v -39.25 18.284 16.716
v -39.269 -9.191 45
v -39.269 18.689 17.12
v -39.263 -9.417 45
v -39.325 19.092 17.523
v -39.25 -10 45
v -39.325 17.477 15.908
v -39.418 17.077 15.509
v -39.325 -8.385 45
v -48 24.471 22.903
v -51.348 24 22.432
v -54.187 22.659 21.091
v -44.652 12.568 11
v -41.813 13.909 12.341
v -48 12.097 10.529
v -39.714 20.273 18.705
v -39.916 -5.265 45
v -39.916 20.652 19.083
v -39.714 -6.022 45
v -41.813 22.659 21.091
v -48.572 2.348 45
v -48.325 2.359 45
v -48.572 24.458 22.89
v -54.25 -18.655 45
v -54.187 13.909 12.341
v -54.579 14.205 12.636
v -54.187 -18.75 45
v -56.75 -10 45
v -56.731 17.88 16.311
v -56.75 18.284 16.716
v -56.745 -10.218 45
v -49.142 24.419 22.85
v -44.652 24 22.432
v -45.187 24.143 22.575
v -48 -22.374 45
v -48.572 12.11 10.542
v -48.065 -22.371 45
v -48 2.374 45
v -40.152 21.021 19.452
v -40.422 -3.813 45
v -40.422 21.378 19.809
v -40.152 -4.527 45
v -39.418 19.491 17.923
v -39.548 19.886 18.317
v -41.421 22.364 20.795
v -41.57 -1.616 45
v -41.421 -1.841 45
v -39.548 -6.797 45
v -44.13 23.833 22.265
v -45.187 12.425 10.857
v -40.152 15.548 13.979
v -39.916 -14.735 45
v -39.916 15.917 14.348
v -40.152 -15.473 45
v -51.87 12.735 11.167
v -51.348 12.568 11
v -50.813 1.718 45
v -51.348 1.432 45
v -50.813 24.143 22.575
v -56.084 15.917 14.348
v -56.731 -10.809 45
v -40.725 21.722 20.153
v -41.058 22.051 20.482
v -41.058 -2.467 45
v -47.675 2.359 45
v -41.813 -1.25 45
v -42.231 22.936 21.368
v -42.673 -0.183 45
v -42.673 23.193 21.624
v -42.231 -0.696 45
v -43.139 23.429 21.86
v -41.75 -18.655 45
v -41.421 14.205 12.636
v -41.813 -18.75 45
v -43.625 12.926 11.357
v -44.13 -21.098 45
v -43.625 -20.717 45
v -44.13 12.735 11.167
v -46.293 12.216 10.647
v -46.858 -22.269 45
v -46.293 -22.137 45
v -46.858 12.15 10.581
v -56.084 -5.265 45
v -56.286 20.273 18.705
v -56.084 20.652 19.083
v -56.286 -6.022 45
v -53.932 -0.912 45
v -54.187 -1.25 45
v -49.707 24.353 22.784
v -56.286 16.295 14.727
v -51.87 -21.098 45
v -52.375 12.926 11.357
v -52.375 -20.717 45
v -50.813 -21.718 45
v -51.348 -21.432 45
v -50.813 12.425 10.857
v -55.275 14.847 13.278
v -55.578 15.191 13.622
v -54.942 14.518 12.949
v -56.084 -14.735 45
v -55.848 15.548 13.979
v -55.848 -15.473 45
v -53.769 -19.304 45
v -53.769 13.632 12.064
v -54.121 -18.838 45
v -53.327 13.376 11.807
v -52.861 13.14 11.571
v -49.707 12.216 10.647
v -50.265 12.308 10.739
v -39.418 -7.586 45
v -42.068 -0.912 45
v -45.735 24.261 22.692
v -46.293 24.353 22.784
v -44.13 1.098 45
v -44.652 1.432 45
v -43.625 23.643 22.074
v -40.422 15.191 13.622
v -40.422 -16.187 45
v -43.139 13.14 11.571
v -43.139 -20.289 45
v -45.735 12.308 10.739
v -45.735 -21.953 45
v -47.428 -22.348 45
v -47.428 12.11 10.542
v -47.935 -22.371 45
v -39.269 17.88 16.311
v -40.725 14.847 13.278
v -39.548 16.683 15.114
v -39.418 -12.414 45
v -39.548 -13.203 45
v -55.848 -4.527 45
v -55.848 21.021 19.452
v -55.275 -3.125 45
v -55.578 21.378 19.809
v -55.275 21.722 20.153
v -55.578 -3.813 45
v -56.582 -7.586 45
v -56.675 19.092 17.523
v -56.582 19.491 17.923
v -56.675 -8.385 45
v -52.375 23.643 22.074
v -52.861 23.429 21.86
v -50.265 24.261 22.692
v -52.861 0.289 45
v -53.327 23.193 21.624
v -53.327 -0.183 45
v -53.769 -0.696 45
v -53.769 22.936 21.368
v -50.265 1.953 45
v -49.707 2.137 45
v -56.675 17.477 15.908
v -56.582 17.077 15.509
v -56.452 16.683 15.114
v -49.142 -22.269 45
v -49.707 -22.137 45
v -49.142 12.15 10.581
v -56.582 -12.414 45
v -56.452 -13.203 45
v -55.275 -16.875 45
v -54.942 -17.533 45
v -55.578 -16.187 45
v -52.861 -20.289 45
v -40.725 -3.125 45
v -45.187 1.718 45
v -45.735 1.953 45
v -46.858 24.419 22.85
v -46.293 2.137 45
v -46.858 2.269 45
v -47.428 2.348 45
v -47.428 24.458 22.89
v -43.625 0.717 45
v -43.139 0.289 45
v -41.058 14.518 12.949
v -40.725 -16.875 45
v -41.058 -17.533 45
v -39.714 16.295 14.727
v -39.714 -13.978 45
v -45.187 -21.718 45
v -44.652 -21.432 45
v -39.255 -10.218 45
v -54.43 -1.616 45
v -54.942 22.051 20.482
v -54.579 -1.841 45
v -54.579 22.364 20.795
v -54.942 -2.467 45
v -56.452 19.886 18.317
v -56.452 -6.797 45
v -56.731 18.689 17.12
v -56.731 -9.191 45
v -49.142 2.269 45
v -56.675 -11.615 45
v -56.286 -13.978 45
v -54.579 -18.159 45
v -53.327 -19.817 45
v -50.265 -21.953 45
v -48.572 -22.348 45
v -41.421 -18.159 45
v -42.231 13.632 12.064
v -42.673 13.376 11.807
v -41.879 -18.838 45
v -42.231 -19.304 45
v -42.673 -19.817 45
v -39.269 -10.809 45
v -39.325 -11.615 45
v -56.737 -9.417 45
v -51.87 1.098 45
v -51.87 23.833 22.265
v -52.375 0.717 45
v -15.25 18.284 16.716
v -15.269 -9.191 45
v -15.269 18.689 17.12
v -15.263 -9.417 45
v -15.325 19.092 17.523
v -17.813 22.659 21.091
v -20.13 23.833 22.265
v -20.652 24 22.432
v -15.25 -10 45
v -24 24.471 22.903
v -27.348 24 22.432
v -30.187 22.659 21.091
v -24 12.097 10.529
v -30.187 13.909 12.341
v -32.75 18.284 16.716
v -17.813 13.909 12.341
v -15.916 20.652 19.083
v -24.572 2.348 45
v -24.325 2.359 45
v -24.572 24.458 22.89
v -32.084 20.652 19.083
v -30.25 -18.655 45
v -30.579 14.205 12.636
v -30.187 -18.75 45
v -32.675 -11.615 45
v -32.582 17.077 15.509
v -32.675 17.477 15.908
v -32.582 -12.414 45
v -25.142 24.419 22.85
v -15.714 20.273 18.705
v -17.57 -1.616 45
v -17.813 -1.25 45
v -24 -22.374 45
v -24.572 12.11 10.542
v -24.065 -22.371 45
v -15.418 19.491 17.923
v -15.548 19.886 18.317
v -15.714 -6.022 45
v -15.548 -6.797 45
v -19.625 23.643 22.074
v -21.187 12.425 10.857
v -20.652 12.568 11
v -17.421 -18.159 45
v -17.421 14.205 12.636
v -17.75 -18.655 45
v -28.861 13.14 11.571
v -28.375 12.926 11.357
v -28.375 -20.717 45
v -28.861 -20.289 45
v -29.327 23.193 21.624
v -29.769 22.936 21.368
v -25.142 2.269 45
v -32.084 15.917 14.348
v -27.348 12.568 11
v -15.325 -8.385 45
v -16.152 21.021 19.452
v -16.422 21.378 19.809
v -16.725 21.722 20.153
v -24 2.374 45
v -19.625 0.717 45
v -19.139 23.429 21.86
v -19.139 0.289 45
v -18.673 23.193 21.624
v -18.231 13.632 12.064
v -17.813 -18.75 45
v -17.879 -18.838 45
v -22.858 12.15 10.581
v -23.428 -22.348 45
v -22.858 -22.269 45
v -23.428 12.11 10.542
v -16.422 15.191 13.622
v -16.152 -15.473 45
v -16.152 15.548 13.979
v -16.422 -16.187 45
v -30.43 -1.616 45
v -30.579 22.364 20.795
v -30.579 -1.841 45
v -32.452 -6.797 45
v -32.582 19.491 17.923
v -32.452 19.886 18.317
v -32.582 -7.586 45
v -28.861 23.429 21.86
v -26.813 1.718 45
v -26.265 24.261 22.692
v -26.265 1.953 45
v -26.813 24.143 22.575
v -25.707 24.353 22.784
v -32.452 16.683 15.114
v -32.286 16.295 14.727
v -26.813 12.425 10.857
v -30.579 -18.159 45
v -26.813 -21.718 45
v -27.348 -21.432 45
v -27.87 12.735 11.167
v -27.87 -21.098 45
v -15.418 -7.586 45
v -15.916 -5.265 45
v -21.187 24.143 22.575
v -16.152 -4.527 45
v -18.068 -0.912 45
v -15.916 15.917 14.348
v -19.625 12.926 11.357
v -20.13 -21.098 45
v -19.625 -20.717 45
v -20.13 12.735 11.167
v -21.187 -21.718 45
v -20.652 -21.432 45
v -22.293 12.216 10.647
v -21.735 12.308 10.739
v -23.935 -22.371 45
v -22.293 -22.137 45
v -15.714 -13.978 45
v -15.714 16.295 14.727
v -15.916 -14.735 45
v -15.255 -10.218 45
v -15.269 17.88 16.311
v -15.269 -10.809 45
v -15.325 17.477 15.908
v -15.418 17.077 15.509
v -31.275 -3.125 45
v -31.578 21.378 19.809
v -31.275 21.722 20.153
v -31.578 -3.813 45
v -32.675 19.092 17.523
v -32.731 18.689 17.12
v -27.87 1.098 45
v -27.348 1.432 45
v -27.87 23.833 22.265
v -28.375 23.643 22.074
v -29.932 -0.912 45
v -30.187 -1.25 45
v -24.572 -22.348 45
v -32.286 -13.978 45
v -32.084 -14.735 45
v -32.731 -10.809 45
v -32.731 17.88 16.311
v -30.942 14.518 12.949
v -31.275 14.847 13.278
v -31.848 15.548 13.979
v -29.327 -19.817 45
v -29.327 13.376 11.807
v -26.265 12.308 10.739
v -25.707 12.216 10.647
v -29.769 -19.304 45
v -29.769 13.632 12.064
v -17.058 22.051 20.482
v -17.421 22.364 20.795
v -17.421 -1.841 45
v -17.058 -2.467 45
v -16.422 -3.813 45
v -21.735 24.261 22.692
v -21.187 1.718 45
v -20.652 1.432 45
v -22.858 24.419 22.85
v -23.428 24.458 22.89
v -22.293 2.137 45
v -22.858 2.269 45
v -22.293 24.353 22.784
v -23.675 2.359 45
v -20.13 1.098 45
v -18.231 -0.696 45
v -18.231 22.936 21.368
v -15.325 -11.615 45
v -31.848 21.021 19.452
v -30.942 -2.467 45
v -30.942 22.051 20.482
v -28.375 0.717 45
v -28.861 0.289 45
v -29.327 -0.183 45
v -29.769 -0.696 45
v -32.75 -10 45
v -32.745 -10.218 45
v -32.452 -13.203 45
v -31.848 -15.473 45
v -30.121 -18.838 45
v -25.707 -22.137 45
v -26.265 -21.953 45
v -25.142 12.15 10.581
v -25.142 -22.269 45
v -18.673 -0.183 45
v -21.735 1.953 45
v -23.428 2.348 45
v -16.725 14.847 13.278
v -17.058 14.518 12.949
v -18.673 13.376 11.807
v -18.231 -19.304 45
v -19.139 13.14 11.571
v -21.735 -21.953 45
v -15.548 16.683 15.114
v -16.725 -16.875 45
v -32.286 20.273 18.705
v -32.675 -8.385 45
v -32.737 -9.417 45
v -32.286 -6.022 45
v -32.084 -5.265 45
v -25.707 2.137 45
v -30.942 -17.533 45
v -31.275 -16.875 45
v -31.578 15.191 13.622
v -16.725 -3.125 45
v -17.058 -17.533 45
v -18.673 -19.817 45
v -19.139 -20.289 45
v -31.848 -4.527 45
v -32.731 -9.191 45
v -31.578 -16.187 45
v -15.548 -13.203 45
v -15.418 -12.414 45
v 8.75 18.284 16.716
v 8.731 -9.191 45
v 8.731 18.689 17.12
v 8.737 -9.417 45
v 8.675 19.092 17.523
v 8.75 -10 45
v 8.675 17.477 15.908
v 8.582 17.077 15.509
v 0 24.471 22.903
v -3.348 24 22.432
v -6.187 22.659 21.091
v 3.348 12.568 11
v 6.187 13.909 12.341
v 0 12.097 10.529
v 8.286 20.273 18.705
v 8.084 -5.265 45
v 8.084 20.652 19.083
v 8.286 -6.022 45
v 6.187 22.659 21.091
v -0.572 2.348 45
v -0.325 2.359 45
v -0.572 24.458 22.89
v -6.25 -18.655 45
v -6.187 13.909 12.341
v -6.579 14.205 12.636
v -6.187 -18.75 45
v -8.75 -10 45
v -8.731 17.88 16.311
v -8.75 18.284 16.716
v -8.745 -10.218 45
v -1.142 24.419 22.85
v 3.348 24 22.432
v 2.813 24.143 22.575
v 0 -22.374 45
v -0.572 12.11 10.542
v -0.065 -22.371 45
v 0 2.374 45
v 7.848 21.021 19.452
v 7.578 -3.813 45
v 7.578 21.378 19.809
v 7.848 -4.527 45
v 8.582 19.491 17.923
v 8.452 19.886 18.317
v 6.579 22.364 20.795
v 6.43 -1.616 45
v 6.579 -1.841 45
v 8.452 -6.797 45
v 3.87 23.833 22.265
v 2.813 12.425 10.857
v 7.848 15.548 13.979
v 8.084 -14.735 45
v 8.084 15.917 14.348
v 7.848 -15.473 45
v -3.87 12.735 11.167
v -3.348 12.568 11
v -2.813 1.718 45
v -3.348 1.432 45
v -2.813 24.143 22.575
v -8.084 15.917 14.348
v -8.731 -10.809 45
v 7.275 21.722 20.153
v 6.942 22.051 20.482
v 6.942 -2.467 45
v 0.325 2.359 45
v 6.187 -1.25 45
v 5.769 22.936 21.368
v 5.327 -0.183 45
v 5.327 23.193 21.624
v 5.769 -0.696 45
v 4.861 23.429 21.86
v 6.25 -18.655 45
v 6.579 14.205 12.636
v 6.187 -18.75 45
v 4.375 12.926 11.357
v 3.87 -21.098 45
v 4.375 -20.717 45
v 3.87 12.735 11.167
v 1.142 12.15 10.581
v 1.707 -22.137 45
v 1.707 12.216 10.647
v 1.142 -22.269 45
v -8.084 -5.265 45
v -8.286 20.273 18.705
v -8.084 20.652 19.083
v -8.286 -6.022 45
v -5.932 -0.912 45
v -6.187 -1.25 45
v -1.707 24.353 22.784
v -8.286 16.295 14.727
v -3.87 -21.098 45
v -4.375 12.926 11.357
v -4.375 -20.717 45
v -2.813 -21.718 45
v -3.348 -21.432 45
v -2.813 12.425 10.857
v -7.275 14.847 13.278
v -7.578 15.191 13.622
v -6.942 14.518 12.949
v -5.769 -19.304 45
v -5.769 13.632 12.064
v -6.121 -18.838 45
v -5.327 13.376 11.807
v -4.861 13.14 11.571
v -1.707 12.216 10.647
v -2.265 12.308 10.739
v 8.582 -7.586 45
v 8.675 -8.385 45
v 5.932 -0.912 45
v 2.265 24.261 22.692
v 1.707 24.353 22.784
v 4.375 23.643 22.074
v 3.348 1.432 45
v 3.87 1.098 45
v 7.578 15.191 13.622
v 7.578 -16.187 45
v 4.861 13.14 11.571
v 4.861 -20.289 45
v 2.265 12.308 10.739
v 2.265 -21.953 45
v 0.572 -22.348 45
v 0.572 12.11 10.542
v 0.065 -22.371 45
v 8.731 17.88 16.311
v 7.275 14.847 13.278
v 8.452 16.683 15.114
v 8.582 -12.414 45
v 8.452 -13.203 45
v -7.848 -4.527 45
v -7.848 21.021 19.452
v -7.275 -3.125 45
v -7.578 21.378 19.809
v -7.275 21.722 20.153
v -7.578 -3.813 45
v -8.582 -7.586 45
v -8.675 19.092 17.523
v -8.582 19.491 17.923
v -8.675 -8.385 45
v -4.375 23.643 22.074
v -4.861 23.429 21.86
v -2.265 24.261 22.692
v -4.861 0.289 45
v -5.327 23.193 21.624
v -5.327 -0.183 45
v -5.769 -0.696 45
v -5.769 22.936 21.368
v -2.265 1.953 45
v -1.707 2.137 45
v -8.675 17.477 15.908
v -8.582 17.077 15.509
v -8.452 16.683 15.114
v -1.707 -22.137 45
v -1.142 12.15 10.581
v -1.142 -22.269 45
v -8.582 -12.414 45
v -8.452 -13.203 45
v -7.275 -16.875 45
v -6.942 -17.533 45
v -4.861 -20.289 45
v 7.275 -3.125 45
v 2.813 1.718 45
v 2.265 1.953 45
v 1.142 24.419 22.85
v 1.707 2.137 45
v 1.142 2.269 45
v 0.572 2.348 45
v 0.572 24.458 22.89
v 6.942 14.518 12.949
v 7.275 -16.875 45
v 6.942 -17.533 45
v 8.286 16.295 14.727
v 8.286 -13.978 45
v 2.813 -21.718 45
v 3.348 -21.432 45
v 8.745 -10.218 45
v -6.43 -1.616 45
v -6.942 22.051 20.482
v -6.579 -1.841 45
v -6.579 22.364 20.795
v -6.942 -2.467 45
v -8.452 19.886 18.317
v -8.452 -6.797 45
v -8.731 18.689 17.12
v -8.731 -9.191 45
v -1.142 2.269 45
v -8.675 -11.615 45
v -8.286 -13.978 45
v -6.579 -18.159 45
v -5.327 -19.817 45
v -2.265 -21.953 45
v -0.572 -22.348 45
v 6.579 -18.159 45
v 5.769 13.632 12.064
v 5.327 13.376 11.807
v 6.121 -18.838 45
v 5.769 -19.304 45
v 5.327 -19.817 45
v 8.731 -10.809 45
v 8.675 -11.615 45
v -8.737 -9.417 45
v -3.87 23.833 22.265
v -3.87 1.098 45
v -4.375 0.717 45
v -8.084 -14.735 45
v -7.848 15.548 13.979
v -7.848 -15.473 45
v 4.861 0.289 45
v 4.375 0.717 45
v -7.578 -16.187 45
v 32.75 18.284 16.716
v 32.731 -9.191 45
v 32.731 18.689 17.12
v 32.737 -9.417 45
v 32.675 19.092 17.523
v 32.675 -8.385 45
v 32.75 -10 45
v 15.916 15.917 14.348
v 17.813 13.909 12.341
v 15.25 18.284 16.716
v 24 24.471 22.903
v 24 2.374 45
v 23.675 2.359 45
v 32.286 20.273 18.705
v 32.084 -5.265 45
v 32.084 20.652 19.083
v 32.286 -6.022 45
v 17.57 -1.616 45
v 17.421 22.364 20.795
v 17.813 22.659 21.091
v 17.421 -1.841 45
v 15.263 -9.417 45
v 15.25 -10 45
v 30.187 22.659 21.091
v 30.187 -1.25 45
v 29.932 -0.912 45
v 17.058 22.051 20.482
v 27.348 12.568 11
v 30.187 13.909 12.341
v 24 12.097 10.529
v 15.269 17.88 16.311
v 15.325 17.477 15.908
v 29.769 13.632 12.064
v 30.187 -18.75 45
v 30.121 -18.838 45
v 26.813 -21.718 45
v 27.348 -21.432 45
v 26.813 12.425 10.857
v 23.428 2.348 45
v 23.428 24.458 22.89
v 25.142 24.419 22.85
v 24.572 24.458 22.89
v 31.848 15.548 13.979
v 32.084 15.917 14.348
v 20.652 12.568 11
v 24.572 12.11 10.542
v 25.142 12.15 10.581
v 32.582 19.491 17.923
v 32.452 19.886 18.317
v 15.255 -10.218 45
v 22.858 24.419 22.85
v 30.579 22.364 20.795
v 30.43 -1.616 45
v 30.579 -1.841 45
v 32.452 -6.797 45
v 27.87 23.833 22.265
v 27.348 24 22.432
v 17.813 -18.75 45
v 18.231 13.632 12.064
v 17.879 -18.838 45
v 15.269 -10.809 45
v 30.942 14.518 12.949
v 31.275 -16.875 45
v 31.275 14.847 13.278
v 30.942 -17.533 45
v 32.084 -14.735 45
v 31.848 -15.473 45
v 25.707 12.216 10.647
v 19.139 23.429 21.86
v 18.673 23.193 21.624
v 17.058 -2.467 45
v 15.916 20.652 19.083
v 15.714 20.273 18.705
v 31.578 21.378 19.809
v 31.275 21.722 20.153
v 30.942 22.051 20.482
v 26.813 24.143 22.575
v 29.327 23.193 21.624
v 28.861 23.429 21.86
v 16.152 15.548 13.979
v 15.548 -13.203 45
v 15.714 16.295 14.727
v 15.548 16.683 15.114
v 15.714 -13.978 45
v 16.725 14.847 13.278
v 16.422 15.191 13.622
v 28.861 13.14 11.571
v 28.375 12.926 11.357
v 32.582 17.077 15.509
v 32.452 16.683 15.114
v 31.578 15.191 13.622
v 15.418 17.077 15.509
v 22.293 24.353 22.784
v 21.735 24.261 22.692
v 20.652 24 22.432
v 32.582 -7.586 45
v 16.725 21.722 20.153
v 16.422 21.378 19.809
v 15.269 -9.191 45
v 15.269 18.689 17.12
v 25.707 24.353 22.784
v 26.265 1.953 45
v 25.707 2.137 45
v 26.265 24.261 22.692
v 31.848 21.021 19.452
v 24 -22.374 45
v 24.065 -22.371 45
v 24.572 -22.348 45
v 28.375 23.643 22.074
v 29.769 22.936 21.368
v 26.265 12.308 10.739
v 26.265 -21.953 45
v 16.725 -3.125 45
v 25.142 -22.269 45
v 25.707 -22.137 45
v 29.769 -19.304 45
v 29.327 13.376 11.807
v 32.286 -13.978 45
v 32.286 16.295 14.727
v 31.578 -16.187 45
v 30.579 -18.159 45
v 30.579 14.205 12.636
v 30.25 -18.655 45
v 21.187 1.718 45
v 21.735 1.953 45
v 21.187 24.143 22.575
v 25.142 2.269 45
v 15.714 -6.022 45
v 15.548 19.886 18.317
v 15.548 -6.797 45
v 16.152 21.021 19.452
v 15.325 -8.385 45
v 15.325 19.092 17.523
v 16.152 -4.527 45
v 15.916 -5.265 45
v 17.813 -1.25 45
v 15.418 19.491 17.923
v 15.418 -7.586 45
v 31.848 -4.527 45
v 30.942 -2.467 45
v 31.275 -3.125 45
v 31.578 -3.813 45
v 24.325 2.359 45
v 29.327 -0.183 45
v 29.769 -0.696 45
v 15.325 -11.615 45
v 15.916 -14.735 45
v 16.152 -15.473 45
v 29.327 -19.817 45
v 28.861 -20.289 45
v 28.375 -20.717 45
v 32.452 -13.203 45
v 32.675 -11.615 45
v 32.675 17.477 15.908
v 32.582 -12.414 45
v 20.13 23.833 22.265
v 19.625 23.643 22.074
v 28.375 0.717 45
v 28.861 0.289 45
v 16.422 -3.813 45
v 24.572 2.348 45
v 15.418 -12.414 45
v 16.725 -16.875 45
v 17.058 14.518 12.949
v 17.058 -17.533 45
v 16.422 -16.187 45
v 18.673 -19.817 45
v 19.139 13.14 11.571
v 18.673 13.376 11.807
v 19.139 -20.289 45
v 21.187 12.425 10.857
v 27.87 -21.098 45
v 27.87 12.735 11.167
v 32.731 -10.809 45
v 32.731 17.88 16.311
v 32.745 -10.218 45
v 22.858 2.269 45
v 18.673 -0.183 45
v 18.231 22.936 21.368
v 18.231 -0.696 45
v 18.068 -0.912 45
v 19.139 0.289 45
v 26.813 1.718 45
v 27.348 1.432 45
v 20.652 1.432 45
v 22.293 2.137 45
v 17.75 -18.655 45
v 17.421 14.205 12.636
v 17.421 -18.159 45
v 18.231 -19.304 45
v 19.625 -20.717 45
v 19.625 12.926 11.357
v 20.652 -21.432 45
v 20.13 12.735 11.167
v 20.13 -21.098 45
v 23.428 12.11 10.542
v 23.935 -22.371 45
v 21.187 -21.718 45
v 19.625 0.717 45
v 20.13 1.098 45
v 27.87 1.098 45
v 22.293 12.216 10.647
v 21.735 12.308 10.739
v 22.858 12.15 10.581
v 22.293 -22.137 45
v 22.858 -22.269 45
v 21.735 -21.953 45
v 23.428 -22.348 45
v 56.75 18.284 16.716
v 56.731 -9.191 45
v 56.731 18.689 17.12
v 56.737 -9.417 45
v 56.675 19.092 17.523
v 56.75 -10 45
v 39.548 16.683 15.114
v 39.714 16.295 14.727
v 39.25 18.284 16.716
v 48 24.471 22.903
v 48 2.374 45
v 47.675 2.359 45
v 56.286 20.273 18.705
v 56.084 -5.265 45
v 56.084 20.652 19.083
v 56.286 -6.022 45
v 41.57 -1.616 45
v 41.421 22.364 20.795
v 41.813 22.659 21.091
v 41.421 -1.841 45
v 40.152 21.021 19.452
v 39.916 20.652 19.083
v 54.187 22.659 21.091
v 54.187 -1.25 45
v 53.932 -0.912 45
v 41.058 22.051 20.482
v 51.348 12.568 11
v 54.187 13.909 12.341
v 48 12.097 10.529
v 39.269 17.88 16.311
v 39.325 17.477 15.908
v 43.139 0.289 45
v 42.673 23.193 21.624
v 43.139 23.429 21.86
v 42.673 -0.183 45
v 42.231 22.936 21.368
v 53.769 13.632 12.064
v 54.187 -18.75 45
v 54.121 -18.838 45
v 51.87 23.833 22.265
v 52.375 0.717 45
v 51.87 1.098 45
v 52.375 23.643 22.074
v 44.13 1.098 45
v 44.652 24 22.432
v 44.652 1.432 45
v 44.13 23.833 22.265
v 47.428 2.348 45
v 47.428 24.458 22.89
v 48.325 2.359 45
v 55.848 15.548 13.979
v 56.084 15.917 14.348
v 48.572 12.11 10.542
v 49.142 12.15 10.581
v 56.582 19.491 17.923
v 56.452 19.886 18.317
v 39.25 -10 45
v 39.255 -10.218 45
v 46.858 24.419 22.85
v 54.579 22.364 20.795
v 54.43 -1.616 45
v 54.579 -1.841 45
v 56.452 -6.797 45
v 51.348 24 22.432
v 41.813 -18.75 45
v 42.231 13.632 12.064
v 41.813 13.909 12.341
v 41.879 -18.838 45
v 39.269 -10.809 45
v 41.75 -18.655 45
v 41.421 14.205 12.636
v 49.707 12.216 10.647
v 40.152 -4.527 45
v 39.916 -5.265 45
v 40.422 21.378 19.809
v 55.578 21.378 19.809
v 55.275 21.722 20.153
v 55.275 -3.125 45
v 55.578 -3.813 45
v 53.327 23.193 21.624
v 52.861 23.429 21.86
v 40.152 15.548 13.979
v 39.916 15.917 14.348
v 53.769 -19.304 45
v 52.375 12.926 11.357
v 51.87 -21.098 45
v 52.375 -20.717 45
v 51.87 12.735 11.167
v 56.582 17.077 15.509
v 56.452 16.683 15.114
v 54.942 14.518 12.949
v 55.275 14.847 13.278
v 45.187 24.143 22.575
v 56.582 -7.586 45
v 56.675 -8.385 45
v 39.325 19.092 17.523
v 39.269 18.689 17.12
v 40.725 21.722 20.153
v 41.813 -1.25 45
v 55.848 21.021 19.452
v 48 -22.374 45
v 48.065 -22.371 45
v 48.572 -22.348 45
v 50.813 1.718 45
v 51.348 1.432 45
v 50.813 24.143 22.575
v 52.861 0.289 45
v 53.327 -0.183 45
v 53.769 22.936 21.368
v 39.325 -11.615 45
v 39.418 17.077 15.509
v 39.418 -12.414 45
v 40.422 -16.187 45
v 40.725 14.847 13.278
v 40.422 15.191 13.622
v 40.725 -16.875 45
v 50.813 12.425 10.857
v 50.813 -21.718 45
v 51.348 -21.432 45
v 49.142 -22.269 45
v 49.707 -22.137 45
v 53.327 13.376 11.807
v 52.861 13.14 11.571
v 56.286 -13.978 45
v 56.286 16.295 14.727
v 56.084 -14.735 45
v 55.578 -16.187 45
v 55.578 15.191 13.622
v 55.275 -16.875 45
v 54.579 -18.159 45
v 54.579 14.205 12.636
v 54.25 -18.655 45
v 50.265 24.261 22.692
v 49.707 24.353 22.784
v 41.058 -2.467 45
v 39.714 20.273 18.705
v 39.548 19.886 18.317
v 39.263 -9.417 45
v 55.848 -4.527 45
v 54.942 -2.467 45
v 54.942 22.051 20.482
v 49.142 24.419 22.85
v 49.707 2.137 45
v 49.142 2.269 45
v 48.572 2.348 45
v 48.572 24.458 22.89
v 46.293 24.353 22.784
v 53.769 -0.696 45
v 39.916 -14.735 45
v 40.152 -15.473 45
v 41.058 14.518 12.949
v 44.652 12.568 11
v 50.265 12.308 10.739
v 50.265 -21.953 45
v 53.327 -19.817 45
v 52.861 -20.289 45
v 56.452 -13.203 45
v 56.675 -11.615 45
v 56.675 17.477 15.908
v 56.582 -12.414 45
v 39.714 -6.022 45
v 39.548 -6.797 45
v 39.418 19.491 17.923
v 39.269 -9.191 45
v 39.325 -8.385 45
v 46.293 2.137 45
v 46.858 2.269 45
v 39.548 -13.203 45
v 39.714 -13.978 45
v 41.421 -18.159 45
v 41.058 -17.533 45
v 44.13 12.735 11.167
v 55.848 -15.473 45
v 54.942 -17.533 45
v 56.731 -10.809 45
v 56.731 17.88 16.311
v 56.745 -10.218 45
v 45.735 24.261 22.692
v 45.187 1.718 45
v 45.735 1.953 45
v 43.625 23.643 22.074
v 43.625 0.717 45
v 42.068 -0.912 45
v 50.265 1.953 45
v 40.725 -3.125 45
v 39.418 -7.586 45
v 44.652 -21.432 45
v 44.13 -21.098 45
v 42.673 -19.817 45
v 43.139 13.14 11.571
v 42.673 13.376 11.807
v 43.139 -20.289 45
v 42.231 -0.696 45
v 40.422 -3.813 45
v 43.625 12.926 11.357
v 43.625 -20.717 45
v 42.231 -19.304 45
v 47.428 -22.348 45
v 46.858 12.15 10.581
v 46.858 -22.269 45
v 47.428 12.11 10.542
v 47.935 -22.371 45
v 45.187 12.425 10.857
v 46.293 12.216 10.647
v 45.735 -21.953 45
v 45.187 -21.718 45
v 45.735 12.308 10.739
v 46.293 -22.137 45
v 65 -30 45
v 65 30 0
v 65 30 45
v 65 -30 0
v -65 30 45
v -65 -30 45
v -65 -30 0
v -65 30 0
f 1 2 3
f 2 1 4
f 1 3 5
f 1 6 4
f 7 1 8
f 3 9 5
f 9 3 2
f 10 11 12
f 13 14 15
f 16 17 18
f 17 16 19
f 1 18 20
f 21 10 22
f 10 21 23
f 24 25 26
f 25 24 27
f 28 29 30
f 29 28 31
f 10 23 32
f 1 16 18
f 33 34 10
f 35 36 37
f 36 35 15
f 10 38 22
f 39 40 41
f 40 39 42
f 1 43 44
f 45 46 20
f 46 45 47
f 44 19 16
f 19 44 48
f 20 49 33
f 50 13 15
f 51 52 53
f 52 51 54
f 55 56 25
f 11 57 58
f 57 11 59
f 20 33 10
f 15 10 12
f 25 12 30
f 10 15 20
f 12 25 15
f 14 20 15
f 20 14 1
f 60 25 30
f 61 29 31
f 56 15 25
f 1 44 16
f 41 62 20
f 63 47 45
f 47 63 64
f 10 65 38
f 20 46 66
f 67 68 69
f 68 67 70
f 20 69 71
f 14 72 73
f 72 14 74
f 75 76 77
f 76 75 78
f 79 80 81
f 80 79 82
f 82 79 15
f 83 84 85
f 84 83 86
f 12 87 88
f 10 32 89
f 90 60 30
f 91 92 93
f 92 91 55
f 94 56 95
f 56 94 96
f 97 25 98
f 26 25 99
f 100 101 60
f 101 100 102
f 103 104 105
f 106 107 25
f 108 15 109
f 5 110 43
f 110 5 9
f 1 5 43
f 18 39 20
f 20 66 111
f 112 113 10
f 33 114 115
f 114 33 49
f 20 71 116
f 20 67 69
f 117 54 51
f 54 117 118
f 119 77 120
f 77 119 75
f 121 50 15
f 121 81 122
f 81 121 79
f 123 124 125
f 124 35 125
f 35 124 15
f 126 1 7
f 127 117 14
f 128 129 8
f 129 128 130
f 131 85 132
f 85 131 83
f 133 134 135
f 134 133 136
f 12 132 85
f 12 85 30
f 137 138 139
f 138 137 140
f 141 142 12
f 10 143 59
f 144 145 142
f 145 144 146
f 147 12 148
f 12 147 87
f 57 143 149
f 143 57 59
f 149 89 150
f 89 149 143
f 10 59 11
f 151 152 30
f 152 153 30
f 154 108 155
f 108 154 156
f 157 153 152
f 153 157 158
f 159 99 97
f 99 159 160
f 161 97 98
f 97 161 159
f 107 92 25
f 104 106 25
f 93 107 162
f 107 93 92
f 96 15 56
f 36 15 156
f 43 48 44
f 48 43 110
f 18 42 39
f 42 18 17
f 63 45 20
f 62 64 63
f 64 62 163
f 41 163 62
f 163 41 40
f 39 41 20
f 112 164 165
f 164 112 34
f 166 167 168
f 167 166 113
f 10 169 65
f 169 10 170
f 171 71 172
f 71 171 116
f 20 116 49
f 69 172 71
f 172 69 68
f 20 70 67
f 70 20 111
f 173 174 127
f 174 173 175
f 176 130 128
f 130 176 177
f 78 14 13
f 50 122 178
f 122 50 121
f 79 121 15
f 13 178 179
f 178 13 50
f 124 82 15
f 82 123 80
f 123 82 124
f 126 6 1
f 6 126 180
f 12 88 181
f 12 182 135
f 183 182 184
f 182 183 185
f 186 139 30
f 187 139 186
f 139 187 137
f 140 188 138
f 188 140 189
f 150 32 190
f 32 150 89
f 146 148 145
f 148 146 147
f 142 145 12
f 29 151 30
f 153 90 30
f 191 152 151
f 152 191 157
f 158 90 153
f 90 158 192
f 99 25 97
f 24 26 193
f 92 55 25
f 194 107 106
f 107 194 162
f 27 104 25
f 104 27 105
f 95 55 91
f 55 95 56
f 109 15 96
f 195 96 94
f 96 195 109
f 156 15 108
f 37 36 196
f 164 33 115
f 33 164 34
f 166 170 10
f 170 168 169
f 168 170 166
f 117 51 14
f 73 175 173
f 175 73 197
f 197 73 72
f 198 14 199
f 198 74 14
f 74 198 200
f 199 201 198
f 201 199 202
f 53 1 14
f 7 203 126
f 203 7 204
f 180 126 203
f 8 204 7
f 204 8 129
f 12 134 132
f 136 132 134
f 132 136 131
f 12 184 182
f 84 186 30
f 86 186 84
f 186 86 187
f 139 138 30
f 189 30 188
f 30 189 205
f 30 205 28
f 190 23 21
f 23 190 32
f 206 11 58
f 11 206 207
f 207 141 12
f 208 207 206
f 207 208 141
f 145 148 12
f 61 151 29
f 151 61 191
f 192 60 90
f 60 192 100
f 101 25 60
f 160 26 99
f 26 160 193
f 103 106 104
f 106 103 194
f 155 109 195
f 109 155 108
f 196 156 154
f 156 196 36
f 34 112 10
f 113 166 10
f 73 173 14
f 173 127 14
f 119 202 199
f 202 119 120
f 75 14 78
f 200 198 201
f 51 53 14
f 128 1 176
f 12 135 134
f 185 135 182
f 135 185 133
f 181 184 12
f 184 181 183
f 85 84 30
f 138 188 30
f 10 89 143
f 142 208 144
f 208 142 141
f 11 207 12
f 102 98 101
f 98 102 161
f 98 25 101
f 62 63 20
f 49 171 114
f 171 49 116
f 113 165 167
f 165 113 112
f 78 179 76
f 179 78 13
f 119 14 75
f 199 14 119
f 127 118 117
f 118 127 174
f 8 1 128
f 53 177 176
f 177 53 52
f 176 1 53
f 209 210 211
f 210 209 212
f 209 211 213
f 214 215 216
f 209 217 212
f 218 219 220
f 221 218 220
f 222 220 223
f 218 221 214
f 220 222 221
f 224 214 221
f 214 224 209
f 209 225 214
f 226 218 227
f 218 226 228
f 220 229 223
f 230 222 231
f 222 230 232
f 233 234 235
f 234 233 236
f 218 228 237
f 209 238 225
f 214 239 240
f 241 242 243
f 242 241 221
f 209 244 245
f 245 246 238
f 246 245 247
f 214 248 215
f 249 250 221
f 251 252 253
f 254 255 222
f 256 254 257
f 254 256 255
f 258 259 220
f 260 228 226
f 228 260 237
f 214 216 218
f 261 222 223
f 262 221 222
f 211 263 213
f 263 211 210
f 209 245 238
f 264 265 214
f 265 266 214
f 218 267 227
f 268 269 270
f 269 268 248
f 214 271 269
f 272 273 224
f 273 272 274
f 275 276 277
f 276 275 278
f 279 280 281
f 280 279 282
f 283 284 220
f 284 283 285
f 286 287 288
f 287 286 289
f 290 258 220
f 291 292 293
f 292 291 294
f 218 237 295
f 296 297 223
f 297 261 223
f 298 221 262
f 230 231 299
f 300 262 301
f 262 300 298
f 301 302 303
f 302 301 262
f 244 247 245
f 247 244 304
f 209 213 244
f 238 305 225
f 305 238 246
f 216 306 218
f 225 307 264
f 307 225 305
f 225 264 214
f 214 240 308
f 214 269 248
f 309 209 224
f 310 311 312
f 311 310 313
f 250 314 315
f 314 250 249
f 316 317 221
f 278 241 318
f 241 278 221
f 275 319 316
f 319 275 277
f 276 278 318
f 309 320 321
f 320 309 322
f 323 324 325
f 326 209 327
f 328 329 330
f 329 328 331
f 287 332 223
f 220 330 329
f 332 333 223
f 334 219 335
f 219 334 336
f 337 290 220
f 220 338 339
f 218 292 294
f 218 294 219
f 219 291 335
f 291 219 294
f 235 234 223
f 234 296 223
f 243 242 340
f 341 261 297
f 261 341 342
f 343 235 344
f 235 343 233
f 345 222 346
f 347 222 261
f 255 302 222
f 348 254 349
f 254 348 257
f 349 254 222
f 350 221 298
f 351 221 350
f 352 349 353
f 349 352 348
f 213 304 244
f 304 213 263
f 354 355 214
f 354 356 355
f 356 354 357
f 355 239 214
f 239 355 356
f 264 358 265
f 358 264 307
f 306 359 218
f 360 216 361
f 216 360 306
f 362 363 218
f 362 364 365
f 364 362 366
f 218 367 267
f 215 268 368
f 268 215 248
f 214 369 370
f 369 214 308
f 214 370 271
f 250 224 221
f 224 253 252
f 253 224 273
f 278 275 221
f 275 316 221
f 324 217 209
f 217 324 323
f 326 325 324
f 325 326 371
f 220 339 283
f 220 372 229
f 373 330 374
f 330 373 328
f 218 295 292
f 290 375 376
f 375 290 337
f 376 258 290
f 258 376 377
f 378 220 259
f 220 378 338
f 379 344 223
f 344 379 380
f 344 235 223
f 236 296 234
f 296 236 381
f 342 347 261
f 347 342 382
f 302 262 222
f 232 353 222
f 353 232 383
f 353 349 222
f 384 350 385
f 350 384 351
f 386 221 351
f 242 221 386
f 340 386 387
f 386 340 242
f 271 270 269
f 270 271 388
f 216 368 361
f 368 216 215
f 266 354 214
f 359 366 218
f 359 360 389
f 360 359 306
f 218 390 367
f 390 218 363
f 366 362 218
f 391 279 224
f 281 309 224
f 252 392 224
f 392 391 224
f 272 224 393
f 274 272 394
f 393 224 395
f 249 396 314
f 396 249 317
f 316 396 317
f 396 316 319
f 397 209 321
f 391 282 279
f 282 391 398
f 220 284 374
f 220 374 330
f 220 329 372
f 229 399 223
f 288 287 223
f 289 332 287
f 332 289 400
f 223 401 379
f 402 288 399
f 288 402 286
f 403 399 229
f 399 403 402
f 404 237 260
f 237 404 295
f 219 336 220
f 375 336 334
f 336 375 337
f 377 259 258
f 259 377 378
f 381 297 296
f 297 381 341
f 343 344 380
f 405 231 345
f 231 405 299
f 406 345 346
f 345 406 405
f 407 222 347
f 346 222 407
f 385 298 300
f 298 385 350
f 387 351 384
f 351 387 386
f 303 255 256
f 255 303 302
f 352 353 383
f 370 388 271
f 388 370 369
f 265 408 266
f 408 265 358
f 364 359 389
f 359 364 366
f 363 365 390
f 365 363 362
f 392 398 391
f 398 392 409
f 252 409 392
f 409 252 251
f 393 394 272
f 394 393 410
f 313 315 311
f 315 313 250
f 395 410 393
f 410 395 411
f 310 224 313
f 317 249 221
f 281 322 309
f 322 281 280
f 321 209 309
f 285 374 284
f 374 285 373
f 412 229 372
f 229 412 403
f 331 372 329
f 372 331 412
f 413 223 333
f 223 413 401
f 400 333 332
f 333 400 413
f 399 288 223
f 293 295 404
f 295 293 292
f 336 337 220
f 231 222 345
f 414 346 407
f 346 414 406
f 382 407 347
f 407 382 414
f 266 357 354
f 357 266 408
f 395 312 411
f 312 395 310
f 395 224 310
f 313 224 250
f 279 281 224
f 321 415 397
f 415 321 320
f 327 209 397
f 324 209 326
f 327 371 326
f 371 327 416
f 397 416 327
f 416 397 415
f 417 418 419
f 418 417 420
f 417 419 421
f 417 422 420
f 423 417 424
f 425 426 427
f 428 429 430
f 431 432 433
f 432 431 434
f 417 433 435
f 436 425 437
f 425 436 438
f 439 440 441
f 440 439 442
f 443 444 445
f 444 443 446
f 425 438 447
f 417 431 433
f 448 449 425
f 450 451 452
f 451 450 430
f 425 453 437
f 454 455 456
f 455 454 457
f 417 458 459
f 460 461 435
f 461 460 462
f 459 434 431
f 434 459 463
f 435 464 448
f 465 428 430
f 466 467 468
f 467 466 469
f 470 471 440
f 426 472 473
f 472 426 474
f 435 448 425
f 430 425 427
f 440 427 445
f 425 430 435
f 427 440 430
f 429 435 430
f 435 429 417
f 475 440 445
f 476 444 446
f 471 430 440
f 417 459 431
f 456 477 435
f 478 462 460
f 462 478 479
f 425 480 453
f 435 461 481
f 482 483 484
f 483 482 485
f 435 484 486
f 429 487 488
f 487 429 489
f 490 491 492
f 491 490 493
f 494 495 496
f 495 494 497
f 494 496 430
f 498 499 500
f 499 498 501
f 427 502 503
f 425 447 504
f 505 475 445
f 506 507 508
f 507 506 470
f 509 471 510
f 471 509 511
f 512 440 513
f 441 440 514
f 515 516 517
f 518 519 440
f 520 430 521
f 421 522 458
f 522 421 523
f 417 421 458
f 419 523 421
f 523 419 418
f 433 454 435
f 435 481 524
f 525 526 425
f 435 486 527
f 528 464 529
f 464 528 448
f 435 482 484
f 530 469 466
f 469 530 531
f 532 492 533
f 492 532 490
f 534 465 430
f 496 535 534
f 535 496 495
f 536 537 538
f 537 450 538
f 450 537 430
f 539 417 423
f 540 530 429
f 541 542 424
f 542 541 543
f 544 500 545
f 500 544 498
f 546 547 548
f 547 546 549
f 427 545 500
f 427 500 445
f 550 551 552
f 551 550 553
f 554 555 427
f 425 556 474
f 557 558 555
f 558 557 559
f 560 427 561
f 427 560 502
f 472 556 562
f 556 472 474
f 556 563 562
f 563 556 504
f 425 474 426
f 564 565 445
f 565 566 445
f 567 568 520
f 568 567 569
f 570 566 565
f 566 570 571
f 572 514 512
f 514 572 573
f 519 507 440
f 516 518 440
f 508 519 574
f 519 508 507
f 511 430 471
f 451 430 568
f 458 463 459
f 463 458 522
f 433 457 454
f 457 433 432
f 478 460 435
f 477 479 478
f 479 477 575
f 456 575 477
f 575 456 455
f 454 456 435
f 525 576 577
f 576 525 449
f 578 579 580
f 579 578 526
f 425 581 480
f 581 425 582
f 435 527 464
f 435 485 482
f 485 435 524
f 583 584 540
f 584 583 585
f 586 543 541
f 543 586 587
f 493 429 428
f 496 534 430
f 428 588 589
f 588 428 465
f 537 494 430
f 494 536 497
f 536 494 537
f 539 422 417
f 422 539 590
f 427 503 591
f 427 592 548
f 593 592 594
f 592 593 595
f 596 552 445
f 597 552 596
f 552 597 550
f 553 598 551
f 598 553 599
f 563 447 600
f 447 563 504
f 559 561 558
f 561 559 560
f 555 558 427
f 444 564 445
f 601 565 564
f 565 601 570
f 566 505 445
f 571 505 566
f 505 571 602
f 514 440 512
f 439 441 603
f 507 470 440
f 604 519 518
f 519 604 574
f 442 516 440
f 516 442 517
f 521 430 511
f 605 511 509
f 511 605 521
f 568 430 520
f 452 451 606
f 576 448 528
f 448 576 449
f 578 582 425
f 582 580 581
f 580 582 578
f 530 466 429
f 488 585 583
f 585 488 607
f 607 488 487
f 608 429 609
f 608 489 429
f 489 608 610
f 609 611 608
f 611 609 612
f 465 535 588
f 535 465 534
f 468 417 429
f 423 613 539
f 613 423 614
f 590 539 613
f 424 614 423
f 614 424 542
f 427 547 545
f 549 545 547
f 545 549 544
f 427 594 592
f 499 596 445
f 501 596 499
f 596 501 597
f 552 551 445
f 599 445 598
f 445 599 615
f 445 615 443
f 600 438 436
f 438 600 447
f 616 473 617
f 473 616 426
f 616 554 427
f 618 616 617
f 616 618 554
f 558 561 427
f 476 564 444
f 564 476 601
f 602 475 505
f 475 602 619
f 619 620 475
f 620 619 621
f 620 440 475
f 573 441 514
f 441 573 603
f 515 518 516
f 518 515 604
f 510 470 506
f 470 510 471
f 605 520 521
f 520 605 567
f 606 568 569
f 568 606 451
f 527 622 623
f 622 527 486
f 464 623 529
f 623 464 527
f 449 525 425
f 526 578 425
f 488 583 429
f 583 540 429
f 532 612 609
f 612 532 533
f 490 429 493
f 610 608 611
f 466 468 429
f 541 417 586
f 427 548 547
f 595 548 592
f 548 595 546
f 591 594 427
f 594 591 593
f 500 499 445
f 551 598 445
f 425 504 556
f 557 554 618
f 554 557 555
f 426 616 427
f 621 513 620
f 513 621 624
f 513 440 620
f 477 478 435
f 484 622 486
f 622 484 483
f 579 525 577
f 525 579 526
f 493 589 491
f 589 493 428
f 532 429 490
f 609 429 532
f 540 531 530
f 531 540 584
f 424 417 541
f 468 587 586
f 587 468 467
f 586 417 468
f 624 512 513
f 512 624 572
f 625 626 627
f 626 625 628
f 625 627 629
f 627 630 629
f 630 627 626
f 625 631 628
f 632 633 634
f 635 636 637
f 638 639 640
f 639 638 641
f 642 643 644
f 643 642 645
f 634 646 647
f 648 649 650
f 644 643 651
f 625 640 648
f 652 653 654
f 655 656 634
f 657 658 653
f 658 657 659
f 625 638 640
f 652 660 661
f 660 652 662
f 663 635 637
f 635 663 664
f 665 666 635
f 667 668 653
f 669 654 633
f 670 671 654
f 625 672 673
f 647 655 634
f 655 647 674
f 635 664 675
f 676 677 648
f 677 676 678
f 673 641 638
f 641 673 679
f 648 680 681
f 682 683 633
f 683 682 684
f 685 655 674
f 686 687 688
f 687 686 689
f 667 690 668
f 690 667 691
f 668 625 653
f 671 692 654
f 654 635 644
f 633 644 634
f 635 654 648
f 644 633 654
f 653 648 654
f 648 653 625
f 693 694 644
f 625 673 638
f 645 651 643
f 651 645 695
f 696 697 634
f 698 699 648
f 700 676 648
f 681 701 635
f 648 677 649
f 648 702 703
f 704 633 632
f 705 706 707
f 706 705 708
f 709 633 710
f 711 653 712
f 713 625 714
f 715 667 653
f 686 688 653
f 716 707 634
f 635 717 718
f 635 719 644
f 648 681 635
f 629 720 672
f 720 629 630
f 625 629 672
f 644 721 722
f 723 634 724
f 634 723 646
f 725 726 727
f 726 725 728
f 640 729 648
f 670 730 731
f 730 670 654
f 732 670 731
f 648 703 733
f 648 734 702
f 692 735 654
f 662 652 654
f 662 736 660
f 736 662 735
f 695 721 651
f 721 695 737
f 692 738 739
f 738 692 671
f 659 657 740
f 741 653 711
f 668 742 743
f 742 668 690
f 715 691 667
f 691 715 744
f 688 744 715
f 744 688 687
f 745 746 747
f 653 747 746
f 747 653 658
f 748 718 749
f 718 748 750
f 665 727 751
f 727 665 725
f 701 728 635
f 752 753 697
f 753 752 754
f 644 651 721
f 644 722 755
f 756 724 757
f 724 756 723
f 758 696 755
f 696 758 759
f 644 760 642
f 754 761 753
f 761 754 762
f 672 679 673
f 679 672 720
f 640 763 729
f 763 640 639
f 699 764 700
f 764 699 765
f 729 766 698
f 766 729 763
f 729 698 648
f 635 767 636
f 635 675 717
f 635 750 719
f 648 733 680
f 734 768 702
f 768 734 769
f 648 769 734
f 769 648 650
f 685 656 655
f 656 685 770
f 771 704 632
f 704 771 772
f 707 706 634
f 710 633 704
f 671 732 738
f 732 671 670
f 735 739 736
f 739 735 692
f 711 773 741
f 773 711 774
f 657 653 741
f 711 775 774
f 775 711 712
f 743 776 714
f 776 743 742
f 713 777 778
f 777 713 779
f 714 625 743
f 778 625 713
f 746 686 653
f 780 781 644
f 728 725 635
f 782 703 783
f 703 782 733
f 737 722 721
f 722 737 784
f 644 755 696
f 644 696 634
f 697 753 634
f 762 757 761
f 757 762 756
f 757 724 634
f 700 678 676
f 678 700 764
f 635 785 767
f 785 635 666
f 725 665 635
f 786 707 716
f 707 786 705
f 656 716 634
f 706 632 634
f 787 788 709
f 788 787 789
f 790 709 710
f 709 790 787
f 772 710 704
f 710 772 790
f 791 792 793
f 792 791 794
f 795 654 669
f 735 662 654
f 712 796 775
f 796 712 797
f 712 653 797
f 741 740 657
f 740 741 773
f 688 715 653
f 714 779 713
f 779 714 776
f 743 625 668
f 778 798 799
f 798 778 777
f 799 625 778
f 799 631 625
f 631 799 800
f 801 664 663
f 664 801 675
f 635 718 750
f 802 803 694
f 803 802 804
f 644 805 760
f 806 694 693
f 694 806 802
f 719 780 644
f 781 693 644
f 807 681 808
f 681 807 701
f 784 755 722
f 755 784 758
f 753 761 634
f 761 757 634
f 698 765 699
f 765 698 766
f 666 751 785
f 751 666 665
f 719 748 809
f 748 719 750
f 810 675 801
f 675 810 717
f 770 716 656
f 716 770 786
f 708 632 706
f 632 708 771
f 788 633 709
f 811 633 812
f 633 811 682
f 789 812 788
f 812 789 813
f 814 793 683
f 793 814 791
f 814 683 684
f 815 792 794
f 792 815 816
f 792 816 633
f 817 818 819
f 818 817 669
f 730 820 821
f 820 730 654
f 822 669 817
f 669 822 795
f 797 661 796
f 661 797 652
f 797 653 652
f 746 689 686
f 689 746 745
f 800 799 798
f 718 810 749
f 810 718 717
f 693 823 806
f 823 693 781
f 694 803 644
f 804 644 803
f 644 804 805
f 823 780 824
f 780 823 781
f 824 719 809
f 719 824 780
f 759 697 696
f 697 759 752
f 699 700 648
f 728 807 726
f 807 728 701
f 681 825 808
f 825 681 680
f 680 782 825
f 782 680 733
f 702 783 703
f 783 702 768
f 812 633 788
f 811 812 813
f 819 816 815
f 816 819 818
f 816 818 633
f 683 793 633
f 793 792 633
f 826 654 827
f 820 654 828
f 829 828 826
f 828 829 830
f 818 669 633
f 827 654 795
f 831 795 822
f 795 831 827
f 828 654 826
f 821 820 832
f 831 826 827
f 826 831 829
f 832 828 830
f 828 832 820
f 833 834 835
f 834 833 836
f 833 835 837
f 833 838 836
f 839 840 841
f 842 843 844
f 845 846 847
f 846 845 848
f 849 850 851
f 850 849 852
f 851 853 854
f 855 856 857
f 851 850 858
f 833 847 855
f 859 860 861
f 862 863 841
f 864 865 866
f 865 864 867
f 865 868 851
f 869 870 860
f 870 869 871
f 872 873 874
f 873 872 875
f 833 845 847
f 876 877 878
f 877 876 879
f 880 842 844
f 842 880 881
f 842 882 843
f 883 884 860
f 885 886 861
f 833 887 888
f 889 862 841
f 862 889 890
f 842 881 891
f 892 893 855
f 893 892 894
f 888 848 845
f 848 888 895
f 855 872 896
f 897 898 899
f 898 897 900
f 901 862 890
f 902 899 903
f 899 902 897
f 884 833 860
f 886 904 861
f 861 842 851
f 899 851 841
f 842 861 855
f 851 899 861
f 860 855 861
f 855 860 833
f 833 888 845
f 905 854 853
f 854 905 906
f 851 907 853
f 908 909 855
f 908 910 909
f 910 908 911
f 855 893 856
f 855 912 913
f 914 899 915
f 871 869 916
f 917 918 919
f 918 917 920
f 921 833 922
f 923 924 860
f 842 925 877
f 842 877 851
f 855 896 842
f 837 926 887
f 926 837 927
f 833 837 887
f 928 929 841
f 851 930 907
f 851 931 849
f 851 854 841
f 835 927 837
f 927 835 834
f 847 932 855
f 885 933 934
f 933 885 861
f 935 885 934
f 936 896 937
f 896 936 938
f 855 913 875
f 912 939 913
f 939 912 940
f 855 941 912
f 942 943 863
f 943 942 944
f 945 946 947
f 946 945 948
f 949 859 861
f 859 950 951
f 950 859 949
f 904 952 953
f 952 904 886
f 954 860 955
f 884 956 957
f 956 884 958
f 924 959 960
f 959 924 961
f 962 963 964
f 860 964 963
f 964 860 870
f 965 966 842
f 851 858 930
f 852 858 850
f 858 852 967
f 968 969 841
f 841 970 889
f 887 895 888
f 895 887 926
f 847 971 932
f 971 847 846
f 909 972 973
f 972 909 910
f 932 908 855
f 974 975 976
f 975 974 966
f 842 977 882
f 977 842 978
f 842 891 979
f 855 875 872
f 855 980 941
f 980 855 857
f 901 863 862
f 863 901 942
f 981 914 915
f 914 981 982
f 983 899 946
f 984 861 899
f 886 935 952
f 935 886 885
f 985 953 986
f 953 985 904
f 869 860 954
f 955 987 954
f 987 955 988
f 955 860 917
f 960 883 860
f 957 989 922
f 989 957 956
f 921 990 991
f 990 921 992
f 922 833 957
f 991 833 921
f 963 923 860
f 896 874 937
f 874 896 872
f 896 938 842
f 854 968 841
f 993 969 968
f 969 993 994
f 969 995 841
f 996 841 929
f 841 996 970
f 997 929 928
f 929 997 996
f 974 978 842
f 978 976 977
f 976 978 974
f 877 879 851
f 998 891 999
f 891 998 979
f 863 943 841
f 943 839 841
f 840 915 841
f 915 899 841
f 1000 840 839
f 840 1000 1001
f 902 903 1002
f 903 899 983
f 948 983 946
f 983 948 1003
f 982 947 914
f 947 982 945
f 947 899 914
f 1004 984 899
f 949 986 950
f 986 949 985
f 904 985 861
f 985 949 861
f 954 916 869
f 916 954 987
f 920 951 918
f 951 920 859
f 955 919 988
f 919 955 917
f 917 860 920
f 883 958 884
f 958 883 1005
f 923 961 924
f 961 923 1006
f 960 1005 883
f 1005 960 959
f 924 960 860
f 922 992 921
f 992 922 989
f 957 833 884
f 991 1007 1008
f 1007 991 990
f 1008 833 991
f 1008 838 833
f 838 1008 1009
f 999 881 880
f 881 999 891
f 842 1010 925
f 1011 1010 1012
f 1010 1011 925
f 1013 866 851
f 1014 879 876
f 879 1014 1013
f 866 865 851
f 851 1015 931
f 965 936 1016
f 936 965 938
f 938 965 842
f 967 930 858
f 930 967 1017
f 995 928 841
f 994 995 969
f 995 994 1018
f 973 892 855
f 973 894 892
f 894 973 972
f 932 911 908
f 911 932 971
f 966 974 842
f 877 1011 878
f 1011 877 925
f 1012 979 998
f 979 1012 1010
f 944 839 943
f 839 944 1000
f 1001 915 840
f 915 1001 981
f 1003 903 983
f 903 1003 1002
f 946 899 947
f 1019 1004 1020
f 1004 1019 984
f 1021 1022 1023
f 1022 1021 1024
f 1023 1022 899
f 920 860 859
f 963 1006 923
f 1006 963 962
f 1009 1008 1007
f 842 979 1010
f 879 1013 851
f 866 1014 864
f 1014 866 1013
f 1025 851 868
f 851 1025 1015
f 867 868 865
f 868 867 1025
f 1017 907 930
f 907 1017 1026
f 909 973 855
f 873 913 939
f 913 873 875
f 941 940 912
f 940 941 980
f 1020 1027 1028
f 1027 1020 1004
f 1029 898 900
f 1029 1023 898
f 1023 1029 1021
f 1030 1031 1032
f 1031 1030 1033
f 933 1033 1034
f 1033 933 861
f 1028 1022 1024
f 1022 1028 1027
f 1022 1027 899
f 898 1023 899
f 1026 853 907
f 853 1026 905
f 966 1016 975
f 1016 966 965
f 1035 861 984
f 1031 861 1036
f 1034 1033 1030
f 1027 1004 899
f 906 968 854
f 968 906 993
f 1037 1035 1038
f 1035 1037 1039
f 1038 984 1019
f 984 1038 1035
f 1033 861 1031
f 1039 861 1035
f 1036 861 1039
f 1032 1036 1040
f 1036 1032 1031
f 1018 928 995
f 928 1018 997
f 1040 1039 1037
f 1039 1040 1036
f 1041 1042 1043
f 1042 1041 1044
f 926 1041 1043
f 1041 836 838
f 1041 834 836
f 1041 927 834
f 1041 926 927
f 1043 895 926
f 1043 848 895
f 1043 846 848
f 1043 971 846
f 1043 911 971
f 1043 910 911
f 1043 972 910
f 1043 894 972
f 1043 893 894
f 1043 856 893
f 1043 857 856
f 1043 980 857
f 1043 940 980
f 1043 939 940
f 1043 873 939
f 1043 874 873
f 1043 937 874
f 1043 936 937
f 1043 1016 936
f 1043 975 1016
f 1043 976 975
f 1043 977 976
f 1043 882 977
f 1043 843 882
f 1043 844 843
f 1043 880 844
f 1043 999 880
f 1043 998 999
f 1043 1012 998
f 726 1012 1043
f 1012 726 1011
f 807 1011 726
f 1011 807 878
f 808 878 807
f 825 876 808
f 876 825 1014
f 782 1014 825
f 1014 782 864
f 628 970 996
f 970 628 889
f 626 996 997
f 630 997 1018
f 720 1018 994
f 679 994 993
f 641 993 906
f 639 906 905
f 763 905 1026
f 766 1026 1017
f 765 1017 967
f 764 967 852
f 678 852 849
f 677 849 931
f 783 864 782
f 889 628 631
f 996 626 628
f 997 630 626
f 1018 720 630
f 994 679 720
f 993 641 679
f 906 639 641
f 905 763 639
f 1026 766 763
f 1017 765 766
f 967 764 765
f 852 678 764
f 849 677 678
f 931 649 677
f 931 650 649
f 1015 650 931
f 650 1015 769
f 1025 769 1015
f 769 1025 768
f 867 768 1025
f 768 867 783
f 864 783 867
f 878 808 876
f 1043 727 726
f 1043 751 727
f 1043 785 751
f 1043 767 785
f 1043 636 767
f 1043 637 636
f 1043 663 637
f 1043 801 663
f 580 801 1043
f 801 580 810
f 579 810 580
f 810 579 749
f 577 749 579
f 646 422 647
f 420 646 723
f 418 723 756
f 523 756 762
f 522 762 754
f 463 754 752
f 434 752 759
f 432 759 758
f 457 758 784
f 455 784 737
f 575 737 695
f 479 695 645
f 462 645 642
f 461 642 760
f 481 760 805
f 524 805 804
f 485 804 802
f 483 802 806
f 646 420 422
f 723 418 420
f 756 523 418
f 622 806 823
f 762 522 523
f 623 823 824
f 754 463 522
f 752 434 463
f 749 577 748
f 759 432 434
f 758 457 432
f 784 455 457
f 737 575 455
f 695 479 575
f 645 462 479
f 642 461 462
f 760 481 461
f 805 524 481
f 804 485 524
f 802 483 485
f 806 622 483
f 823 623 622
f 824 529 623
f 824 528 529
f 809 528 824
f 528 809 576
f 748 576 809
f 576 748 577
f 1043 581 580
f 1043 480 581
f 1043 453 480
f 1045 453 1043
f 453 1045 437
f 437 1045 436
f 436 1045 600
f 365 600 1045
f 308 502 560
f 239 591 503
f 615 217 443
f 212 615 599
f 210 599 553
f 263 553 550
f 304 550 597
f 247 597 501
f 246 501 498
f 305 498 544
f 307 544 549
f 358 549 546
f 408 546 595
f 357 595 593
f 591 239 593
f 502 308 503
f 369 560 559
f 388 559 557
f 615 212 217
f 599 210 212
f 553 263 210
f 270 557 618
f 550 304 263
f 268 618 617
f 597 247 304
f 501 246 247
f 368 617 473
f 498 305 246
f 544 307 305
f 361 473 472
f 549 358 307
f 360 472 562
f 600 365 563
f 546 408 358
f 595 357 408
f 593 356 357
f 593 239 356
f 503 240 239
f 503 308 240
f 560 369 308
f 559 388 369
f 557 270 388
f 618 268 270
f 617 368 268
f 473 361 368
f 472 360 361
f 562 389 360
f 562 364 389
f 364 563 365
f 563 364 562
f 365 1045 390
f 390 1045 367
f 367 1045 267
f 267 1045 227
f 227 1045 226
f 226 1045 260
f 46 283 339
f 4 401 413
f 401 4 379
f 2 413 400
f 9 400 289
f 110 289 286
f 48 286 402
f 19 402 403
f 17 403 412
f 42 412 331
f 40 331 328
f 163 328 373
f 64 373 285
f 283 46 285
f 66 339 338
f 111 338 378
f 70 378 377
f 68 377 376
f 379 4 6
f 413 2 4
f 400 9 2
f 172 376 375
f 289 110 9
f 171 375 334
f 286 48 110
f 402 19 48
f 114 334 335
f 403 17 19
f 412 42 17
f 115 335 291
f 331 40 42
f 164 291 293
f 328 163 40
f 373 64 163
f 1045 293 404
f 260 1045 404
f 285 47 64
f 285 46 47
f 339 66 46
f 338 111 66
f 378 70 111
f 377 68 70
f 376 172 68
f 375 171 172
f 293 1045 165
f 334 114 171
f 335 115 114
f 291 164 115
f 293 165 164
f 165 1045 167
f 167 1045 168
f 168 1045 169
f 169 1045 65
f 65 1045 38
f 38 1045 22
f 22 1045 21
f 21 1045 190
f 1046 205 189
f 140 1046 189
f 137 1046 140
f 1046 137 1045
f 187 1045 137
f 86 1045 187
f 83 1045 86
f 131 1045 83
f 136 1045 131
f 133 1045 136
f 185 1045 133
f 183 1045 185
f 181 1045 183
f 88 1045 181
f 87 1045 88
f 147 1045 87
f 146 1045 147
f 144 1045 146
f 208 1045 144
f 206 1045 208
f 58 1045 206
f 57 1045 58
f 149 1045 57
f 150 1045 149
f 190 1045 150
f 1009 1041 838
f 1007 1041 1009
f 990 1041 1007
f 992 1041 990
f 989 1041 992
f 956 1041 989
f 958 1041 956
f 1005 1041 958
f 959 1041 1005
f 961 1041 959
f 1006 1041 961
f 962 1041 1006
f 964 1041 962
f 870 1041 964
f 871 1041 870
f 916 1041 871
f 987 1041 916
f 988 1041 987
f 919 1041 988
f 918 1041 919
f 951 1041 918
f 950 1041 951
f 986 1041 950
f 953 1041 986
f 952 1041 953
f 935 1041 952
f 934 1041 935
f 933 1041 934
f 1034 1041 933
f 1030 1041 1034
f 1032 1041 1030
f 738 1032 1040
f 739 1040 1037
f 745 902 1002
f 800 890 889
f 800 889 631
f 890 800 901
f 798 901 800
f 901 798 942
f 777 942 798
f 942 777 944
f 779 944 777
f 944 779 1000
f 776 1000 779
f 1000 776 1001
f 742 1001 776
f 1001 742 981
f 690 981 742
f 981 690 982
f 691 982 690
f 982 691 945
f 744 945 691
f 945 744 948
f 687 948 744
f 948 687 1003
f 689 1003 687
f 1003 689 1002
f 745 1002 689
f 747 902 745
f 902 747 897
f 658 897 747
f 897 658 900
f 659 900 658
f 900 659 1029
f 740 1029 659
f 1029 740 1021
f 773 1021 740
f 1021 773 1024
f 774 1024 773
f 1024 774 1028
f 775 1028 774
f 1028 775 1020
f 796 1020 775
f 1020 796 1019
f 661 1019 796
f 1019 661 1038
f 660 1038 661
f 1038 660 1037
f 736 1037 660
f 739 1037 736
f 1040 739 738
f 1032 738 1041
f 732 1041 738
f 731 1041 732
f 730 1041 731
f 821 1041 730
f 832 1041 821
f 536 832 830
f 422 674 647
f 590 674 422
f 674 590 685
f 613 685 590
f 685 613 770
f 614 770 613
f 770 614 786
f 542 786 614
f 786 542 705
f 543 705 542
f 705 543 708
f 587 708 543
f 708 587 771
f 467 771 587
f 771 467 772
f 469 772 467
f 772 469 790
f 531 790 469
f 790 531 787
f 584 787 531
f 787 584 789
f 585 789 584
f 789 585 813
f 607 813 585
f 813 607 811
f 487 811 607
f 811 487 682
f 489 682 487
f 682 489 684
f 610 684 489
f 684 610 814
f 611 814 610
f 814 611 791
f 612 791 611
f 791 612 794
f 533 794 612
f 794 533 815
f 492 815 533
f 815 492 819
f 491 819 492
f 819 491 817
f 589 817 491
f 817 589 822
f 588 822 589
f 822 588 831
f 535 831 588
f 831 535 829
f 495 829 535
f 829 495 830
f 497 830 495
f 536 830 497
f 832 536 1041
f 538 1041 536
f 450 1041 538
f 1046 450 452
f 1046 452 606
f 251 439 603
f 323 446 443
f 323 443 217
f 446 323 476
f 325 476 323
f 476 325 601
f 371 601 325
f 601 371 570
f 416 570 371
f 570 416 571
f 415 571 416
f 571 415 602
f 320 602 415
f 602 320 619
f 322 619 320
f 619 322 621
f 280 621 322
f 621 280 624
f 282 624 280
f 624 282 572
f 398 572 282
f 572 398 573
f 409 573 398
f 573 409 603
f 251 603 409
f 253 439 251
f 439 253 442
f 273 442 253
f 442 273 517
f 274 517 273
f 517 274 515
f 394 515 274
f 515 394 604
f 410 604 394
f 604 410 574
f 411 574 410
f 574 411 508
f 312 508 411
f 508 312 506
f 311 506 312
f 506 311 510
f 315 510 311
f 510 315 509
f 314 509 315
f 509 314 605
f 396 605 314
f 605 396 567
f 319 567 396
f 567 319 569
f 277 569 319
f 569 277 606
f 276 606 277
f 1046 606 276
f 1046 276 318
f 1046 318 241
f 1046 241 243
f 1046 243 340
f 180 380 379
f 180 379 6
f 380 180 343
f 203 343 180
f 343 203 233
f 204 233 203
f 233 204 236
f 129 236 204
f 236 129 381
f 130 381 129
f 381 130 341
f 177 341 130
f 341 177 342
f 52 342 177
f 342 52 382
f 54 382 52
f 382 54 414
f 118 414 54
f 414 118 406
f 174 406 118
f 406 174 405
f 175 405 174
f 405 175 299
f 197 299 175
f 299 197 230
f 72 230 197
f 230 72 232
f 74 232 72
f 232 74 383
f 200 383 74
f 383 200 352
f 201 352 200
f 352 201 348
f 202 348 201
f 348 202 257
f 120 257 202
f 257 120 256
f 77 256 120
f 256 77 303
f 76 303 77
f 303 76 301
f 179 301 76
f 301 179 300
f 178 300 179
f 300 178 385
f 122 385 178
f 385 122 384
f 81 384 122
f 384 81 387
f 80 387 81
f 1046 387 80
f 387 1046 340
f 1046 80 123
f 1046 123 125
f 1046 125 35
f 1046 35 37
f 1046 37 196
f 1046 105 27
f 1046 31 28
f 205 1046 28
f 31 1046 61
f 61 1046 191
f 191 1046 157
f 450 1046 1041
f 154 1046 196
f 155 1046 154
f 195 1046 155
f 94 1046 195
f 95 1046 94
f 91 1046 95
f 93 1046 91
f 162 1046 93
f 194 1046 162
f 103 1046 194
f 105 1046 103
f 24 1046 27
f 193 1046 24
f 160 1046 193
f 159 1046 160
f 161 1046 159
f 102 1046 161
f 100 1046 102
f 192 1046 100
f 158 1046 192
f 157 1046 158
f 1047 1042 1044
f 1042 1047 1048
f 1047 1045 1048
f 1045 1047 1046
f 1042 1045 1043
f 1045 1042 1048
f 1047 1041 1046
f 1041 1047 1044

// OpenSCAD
// KNOWN-WRONG PART (must fail): the holes are tilted 45 degrees instead of 30
// Rack that holds five 15 mL conical tubes at a 30-degree lean (reading volumes, pipetting off
// supernatant). Category: benchware. A solid block with five blind holes tilted 30 degrees from
// vertical; the hole roofs overhang at 60 degrees from horizontal, so it prints without supports.
// Print: PLA or PETG, standing on the bed, 0.2 mm layers, 15 % infill.
// SPDX-License-Identifier: CERN-OHL-P-2.0

/* [Rack] */
block = [130, 60, 45];    // X, Y, Z [mm], centred in X and Y
n = 5;
pitch = 24;               // along X
hole_d = 17.5;            // square to the axis
tilt = 45;                // degrees from vertical; going down, the hole moves toward +Y
entry_y = -10;            // the axis meets the top face at y = -10
depth = 40;               // along the axis, flat end square to the axis

/* [Hidden] */
eps = 0.01;

difference() {
    translate([-block.x / 2, -block.y / 2, 0]) cube(block);
    for (i = [0 : n - 1])
        translate([(i - (n - 1) / 2) * pitch, entry_y, block.z])
            rotate([tilt, 0, 0])            // local +Z (up the hole) -> (0, -sin, cos)
                translate([0, 0, -depth]) cylinder(d = hole_d, h = depth + 15, $fn = 96);
}
